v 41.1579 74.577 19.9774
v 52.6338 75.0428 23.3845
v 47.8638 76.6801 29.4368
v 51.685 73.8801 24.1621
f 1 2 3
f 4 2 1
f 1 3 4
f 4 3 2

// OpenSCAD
// Auto-generated auxetic polyhedron
points = [
    [47.863808, 76.680104, 29.436812],
    [52.633814, 75.042843, 23.384456],
    [41.157878, 74.576973, 19.977366],
    [51.684982, 73.880093, 24.162111],
];

faces = [
    [0, 1, 2],
    [2, 1, 3],
    [3, 0, 2],
    [1, 0, 3],
];

polyhedron(points = points, faces = faces);
